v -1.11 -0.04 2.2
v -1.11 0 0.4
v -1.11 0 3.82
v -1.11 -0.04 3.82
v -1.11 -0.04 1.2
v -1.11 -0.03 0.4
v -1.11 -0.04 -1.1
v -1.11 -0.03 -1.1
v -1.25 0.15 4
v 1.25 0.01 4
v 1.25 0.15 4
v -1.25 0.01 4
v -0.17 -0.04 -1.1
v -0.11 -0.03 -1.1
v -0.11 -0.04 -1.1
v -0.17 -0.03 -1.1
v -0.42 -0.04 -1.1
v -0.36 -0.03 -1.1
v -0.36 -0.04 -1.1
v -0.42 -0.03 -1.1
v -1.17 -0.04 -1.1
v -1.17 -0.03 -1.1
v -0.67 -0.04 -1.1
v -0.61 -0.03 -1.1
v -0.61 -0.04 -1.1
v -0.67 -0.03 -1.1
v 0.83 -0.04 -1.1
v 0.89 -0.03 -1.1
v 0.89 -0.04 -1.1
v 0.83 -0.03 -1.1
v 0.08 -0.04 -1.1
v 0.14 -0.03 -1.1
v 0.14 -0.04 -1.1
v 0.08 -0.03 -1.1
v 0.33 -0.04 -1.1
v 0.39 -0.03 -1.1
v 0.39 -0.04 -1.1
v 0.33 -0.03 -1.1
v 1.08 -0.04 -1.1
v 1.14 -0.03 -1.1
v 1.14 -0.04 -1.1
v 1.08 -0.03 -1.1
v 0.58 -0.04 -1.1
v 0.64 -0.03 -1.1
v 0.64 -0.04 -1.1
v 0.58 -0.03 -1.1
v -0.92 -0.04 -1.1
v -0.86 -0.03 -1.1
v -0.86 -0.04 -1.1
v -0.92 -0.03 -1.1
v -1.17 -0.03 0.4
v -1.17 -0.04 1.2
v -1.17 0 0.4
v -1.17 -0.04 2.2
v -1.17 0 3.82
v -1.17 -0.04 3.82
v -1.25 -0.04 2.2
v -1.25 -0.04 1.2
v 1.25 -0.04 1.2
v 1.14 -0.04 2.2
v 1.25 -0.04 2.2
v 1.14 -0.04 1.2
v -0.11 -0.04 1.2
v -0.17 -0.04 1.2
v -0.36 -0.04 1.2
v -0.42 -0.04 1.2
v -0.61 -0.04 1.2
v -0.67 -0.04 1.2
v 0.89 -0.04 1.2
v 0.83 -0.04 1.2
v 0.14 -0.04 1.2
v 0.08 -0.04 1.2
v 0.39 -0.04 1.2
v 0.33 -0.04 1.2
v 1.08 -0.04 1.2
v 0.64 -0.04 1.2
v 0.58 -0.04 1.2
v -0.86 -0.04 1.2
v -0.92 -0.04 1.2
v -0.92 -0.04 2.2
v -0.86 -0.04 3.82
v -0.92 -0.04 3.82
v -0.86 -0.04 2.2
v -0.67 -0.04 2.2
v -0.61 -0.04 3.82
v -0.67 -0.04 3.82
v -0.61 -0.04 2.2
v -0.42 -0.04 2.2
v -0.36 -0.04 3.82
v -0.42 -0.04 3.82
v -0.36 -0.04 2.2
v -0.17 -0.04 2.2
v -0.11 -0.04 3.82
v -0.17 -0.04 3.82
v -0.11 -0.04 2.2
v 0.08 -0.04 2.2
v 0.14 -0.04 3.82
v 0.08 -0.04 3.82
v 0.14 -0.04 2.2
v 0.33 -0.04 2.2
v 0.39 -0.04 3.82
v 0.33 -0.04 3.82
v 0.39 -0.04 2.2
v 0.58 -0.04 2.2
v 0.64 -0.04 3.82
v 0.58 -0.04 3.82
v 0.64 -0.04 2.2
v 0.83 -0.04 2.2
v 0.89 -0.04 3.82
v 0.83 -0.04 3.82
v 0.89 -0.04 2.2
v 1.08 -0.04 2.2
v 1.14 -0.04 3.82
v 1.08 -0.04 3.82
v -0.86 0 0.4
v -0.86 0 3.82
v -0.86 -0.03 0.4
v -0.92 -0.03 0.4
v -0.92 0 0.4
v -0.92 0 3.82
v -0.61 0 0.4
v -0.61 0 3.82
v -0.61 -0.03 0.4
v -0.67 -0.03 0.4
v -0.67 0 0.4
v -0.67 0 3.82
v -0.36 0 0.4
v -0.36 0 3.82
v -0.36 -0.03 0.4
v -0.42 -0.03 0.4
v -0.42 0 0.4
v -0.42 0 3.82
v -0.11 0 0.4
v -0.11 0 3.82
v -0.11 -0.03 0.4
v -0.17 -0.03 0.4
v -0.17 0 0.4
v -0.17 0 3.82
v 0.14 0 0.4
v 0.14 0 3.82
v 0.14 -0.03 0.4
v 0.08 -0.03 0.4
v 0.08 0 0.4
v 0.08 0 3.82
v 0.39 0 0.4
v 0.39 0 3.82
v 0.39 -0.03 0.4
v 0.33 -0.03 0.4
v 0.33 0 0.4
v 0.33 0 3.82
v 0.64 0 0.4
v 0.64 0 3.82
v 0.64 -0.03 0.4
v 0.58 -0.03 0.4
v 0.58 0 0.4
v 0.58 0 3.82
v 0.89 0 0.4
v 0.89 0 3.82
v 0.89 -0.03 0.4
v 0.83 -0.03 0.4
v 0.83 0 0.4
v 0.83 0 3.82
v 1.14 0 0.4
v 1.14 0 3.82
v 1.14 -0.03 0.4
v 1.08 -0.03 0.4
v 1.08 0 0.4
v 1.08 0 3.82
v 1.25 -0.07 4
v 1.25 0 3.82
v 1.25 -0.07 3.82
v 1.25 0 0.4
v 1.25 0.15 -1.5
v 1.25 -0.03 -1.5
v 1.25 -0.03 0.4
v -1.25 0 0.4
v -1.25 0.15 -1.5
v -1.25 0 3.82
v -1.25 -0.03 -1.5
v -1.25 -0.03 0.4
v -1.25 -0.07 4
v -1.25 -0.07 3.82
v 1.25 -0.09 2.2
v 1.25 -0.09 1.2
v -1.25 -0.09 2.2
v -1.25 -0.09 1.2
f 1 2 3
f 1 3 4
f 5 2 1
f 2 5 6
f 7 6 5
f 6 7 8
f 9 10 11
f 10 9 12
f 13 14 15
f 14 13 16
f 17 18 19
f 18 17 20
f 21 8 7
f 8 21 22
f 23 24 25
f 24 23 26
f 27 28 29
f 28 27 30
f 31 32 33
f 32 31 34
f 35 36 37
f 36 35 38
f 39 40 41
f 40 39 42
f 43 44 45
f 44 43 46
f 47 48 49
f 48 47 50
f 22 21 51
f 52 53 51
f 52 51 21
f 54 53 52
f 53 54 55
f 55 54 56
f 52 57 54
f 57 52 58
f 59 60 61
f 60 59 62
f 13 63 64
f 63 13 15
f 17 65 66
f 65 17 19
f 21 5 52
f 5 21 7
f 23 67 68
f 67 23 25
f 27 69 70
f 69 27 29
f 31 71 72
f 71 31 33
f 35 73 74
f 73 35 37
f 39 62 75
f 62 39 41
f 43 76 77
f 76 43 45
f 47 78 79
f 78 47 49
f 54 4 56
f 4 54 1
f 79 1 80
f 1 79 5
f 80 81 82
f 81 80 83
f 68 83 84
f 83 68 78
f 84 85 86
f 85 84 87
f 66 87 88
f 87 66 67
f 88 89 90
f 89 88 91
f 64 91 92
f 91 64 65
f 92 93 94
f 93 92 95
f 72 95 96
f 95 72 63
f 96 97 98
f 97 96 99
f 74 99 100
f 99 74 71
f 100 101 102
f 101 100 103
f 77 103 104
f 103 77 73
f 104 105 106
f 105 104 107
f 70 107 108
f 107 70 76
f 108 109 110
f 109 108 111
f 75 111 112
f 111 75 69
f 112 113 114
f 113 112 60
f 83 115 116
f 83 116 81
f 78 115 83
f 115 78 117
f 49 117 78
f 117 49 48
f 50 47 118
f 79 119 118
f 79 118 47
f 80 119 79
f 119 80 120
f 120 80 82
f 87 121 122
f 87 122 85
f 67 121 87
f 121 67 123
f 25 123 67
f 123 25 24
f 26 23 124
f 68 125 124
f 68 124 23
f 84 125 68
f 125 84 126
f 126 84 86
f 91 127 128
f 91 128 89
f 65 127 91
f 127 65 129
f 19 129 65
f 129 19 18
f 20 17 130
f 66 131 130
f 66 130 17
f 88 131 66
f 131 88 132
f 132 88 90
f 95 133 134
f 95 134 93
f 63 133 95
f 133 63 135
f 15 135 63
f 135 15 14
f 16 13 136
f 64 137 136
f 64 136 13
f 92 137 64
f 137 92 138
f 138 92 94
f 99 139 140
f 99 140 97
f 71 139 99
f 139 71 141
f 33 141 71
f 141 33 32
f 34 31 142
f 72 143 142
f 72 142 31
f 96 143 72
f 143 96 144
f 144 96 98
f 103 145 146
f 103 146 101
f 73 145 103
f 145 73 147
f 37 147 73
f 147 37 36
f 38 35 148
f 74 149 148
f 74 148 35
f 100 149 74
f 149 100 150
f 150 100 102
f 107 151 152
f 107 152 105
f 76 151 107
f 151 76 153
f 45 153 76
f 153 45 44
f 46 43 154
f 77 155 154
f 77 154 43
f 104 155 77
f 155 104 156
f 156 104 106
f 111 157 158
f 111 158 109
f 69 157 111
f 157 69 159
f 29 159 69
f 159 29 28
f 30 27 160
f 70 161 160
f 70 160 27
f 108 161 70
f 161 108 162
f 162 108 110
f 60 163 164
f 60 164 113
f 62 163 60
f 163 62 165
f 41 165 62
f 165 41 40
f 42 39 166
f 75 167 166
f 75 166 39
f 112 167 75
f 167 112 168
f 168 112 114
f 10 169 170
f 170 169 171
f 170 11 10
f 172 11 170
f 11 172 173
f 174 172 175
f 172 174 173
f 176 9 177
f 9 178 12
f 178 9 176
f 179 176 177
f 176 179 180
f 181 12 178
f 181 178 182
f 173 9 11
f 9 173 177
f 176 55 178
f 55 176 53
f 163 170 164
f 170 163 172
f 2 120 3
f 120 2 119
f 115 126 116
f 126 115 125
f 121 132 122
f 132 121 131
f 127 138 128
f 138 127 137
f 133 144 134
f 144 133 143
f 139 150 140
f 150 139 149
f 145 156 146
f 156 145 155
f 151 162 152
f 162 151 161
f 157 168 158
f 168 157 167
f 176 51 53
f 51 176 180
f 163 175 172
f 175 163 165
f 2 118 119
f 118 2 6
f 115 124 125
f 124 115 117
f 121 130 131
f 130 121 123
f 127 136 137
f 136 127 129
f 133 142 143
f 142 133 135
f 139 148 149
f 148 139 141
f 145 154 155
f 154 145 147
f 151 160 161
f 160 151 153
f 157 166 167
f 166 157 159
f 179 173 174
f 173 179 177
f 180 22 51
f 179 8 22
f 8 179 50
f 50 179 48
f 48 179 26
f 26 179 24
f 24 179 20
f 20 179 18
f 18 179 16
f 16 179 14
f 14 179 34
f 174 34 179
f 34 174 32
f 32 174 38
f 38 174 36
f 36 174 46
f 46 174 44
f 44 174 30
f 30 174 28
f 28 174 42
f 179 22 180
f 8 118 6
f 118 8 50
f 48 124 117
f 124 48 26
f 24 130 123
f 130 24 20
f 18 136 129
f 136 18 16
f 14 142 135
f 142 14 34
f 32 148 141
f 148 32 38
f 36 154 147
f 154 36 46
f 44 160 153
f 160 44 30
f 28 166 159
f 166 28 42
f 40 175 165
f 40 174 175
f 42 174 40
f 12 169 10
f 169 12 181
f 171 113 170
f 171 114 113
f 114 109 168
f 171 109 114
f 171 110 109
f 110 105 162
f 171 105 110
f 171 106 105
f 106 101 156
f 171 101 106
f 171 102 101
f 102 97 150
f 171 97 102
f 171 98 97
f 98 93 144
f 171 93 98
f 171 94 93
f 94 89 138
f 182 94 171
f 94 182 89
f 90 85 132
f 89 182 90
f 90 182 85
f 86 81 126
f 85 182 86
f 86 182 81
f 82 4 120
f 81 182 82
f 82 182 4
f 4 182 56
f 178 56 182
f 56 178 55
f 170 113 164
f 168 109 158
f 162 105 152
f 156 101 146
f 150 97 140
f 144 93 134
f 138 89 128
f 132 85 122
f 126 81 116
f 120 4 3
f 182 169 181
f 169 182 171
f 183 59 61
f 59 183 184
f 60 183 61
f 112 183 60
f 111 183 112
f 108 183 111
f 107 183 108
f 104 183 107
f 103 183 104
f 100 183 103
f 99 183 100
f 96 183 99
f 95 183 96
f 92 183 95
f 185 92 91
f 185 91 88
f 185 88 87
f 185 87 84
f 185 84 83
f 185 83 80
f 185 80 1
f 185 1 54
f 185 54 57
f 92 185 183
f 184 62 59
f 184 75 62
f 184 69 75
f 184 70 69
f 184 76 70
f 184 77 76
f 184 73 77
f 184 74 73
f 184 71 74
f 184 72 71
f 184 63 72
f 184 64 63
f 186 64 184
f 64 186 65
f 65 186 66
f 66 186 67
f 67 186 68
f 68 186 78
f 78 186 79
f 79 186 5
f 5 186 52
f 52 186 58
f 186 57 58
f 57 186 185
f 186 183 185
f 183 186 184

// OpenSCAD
// Shed shell kit: wall glazed. See lib/lodge_kit.scad.
include <lib/lodge_kit.scad>
kind = "shed";
wall_glazed();
